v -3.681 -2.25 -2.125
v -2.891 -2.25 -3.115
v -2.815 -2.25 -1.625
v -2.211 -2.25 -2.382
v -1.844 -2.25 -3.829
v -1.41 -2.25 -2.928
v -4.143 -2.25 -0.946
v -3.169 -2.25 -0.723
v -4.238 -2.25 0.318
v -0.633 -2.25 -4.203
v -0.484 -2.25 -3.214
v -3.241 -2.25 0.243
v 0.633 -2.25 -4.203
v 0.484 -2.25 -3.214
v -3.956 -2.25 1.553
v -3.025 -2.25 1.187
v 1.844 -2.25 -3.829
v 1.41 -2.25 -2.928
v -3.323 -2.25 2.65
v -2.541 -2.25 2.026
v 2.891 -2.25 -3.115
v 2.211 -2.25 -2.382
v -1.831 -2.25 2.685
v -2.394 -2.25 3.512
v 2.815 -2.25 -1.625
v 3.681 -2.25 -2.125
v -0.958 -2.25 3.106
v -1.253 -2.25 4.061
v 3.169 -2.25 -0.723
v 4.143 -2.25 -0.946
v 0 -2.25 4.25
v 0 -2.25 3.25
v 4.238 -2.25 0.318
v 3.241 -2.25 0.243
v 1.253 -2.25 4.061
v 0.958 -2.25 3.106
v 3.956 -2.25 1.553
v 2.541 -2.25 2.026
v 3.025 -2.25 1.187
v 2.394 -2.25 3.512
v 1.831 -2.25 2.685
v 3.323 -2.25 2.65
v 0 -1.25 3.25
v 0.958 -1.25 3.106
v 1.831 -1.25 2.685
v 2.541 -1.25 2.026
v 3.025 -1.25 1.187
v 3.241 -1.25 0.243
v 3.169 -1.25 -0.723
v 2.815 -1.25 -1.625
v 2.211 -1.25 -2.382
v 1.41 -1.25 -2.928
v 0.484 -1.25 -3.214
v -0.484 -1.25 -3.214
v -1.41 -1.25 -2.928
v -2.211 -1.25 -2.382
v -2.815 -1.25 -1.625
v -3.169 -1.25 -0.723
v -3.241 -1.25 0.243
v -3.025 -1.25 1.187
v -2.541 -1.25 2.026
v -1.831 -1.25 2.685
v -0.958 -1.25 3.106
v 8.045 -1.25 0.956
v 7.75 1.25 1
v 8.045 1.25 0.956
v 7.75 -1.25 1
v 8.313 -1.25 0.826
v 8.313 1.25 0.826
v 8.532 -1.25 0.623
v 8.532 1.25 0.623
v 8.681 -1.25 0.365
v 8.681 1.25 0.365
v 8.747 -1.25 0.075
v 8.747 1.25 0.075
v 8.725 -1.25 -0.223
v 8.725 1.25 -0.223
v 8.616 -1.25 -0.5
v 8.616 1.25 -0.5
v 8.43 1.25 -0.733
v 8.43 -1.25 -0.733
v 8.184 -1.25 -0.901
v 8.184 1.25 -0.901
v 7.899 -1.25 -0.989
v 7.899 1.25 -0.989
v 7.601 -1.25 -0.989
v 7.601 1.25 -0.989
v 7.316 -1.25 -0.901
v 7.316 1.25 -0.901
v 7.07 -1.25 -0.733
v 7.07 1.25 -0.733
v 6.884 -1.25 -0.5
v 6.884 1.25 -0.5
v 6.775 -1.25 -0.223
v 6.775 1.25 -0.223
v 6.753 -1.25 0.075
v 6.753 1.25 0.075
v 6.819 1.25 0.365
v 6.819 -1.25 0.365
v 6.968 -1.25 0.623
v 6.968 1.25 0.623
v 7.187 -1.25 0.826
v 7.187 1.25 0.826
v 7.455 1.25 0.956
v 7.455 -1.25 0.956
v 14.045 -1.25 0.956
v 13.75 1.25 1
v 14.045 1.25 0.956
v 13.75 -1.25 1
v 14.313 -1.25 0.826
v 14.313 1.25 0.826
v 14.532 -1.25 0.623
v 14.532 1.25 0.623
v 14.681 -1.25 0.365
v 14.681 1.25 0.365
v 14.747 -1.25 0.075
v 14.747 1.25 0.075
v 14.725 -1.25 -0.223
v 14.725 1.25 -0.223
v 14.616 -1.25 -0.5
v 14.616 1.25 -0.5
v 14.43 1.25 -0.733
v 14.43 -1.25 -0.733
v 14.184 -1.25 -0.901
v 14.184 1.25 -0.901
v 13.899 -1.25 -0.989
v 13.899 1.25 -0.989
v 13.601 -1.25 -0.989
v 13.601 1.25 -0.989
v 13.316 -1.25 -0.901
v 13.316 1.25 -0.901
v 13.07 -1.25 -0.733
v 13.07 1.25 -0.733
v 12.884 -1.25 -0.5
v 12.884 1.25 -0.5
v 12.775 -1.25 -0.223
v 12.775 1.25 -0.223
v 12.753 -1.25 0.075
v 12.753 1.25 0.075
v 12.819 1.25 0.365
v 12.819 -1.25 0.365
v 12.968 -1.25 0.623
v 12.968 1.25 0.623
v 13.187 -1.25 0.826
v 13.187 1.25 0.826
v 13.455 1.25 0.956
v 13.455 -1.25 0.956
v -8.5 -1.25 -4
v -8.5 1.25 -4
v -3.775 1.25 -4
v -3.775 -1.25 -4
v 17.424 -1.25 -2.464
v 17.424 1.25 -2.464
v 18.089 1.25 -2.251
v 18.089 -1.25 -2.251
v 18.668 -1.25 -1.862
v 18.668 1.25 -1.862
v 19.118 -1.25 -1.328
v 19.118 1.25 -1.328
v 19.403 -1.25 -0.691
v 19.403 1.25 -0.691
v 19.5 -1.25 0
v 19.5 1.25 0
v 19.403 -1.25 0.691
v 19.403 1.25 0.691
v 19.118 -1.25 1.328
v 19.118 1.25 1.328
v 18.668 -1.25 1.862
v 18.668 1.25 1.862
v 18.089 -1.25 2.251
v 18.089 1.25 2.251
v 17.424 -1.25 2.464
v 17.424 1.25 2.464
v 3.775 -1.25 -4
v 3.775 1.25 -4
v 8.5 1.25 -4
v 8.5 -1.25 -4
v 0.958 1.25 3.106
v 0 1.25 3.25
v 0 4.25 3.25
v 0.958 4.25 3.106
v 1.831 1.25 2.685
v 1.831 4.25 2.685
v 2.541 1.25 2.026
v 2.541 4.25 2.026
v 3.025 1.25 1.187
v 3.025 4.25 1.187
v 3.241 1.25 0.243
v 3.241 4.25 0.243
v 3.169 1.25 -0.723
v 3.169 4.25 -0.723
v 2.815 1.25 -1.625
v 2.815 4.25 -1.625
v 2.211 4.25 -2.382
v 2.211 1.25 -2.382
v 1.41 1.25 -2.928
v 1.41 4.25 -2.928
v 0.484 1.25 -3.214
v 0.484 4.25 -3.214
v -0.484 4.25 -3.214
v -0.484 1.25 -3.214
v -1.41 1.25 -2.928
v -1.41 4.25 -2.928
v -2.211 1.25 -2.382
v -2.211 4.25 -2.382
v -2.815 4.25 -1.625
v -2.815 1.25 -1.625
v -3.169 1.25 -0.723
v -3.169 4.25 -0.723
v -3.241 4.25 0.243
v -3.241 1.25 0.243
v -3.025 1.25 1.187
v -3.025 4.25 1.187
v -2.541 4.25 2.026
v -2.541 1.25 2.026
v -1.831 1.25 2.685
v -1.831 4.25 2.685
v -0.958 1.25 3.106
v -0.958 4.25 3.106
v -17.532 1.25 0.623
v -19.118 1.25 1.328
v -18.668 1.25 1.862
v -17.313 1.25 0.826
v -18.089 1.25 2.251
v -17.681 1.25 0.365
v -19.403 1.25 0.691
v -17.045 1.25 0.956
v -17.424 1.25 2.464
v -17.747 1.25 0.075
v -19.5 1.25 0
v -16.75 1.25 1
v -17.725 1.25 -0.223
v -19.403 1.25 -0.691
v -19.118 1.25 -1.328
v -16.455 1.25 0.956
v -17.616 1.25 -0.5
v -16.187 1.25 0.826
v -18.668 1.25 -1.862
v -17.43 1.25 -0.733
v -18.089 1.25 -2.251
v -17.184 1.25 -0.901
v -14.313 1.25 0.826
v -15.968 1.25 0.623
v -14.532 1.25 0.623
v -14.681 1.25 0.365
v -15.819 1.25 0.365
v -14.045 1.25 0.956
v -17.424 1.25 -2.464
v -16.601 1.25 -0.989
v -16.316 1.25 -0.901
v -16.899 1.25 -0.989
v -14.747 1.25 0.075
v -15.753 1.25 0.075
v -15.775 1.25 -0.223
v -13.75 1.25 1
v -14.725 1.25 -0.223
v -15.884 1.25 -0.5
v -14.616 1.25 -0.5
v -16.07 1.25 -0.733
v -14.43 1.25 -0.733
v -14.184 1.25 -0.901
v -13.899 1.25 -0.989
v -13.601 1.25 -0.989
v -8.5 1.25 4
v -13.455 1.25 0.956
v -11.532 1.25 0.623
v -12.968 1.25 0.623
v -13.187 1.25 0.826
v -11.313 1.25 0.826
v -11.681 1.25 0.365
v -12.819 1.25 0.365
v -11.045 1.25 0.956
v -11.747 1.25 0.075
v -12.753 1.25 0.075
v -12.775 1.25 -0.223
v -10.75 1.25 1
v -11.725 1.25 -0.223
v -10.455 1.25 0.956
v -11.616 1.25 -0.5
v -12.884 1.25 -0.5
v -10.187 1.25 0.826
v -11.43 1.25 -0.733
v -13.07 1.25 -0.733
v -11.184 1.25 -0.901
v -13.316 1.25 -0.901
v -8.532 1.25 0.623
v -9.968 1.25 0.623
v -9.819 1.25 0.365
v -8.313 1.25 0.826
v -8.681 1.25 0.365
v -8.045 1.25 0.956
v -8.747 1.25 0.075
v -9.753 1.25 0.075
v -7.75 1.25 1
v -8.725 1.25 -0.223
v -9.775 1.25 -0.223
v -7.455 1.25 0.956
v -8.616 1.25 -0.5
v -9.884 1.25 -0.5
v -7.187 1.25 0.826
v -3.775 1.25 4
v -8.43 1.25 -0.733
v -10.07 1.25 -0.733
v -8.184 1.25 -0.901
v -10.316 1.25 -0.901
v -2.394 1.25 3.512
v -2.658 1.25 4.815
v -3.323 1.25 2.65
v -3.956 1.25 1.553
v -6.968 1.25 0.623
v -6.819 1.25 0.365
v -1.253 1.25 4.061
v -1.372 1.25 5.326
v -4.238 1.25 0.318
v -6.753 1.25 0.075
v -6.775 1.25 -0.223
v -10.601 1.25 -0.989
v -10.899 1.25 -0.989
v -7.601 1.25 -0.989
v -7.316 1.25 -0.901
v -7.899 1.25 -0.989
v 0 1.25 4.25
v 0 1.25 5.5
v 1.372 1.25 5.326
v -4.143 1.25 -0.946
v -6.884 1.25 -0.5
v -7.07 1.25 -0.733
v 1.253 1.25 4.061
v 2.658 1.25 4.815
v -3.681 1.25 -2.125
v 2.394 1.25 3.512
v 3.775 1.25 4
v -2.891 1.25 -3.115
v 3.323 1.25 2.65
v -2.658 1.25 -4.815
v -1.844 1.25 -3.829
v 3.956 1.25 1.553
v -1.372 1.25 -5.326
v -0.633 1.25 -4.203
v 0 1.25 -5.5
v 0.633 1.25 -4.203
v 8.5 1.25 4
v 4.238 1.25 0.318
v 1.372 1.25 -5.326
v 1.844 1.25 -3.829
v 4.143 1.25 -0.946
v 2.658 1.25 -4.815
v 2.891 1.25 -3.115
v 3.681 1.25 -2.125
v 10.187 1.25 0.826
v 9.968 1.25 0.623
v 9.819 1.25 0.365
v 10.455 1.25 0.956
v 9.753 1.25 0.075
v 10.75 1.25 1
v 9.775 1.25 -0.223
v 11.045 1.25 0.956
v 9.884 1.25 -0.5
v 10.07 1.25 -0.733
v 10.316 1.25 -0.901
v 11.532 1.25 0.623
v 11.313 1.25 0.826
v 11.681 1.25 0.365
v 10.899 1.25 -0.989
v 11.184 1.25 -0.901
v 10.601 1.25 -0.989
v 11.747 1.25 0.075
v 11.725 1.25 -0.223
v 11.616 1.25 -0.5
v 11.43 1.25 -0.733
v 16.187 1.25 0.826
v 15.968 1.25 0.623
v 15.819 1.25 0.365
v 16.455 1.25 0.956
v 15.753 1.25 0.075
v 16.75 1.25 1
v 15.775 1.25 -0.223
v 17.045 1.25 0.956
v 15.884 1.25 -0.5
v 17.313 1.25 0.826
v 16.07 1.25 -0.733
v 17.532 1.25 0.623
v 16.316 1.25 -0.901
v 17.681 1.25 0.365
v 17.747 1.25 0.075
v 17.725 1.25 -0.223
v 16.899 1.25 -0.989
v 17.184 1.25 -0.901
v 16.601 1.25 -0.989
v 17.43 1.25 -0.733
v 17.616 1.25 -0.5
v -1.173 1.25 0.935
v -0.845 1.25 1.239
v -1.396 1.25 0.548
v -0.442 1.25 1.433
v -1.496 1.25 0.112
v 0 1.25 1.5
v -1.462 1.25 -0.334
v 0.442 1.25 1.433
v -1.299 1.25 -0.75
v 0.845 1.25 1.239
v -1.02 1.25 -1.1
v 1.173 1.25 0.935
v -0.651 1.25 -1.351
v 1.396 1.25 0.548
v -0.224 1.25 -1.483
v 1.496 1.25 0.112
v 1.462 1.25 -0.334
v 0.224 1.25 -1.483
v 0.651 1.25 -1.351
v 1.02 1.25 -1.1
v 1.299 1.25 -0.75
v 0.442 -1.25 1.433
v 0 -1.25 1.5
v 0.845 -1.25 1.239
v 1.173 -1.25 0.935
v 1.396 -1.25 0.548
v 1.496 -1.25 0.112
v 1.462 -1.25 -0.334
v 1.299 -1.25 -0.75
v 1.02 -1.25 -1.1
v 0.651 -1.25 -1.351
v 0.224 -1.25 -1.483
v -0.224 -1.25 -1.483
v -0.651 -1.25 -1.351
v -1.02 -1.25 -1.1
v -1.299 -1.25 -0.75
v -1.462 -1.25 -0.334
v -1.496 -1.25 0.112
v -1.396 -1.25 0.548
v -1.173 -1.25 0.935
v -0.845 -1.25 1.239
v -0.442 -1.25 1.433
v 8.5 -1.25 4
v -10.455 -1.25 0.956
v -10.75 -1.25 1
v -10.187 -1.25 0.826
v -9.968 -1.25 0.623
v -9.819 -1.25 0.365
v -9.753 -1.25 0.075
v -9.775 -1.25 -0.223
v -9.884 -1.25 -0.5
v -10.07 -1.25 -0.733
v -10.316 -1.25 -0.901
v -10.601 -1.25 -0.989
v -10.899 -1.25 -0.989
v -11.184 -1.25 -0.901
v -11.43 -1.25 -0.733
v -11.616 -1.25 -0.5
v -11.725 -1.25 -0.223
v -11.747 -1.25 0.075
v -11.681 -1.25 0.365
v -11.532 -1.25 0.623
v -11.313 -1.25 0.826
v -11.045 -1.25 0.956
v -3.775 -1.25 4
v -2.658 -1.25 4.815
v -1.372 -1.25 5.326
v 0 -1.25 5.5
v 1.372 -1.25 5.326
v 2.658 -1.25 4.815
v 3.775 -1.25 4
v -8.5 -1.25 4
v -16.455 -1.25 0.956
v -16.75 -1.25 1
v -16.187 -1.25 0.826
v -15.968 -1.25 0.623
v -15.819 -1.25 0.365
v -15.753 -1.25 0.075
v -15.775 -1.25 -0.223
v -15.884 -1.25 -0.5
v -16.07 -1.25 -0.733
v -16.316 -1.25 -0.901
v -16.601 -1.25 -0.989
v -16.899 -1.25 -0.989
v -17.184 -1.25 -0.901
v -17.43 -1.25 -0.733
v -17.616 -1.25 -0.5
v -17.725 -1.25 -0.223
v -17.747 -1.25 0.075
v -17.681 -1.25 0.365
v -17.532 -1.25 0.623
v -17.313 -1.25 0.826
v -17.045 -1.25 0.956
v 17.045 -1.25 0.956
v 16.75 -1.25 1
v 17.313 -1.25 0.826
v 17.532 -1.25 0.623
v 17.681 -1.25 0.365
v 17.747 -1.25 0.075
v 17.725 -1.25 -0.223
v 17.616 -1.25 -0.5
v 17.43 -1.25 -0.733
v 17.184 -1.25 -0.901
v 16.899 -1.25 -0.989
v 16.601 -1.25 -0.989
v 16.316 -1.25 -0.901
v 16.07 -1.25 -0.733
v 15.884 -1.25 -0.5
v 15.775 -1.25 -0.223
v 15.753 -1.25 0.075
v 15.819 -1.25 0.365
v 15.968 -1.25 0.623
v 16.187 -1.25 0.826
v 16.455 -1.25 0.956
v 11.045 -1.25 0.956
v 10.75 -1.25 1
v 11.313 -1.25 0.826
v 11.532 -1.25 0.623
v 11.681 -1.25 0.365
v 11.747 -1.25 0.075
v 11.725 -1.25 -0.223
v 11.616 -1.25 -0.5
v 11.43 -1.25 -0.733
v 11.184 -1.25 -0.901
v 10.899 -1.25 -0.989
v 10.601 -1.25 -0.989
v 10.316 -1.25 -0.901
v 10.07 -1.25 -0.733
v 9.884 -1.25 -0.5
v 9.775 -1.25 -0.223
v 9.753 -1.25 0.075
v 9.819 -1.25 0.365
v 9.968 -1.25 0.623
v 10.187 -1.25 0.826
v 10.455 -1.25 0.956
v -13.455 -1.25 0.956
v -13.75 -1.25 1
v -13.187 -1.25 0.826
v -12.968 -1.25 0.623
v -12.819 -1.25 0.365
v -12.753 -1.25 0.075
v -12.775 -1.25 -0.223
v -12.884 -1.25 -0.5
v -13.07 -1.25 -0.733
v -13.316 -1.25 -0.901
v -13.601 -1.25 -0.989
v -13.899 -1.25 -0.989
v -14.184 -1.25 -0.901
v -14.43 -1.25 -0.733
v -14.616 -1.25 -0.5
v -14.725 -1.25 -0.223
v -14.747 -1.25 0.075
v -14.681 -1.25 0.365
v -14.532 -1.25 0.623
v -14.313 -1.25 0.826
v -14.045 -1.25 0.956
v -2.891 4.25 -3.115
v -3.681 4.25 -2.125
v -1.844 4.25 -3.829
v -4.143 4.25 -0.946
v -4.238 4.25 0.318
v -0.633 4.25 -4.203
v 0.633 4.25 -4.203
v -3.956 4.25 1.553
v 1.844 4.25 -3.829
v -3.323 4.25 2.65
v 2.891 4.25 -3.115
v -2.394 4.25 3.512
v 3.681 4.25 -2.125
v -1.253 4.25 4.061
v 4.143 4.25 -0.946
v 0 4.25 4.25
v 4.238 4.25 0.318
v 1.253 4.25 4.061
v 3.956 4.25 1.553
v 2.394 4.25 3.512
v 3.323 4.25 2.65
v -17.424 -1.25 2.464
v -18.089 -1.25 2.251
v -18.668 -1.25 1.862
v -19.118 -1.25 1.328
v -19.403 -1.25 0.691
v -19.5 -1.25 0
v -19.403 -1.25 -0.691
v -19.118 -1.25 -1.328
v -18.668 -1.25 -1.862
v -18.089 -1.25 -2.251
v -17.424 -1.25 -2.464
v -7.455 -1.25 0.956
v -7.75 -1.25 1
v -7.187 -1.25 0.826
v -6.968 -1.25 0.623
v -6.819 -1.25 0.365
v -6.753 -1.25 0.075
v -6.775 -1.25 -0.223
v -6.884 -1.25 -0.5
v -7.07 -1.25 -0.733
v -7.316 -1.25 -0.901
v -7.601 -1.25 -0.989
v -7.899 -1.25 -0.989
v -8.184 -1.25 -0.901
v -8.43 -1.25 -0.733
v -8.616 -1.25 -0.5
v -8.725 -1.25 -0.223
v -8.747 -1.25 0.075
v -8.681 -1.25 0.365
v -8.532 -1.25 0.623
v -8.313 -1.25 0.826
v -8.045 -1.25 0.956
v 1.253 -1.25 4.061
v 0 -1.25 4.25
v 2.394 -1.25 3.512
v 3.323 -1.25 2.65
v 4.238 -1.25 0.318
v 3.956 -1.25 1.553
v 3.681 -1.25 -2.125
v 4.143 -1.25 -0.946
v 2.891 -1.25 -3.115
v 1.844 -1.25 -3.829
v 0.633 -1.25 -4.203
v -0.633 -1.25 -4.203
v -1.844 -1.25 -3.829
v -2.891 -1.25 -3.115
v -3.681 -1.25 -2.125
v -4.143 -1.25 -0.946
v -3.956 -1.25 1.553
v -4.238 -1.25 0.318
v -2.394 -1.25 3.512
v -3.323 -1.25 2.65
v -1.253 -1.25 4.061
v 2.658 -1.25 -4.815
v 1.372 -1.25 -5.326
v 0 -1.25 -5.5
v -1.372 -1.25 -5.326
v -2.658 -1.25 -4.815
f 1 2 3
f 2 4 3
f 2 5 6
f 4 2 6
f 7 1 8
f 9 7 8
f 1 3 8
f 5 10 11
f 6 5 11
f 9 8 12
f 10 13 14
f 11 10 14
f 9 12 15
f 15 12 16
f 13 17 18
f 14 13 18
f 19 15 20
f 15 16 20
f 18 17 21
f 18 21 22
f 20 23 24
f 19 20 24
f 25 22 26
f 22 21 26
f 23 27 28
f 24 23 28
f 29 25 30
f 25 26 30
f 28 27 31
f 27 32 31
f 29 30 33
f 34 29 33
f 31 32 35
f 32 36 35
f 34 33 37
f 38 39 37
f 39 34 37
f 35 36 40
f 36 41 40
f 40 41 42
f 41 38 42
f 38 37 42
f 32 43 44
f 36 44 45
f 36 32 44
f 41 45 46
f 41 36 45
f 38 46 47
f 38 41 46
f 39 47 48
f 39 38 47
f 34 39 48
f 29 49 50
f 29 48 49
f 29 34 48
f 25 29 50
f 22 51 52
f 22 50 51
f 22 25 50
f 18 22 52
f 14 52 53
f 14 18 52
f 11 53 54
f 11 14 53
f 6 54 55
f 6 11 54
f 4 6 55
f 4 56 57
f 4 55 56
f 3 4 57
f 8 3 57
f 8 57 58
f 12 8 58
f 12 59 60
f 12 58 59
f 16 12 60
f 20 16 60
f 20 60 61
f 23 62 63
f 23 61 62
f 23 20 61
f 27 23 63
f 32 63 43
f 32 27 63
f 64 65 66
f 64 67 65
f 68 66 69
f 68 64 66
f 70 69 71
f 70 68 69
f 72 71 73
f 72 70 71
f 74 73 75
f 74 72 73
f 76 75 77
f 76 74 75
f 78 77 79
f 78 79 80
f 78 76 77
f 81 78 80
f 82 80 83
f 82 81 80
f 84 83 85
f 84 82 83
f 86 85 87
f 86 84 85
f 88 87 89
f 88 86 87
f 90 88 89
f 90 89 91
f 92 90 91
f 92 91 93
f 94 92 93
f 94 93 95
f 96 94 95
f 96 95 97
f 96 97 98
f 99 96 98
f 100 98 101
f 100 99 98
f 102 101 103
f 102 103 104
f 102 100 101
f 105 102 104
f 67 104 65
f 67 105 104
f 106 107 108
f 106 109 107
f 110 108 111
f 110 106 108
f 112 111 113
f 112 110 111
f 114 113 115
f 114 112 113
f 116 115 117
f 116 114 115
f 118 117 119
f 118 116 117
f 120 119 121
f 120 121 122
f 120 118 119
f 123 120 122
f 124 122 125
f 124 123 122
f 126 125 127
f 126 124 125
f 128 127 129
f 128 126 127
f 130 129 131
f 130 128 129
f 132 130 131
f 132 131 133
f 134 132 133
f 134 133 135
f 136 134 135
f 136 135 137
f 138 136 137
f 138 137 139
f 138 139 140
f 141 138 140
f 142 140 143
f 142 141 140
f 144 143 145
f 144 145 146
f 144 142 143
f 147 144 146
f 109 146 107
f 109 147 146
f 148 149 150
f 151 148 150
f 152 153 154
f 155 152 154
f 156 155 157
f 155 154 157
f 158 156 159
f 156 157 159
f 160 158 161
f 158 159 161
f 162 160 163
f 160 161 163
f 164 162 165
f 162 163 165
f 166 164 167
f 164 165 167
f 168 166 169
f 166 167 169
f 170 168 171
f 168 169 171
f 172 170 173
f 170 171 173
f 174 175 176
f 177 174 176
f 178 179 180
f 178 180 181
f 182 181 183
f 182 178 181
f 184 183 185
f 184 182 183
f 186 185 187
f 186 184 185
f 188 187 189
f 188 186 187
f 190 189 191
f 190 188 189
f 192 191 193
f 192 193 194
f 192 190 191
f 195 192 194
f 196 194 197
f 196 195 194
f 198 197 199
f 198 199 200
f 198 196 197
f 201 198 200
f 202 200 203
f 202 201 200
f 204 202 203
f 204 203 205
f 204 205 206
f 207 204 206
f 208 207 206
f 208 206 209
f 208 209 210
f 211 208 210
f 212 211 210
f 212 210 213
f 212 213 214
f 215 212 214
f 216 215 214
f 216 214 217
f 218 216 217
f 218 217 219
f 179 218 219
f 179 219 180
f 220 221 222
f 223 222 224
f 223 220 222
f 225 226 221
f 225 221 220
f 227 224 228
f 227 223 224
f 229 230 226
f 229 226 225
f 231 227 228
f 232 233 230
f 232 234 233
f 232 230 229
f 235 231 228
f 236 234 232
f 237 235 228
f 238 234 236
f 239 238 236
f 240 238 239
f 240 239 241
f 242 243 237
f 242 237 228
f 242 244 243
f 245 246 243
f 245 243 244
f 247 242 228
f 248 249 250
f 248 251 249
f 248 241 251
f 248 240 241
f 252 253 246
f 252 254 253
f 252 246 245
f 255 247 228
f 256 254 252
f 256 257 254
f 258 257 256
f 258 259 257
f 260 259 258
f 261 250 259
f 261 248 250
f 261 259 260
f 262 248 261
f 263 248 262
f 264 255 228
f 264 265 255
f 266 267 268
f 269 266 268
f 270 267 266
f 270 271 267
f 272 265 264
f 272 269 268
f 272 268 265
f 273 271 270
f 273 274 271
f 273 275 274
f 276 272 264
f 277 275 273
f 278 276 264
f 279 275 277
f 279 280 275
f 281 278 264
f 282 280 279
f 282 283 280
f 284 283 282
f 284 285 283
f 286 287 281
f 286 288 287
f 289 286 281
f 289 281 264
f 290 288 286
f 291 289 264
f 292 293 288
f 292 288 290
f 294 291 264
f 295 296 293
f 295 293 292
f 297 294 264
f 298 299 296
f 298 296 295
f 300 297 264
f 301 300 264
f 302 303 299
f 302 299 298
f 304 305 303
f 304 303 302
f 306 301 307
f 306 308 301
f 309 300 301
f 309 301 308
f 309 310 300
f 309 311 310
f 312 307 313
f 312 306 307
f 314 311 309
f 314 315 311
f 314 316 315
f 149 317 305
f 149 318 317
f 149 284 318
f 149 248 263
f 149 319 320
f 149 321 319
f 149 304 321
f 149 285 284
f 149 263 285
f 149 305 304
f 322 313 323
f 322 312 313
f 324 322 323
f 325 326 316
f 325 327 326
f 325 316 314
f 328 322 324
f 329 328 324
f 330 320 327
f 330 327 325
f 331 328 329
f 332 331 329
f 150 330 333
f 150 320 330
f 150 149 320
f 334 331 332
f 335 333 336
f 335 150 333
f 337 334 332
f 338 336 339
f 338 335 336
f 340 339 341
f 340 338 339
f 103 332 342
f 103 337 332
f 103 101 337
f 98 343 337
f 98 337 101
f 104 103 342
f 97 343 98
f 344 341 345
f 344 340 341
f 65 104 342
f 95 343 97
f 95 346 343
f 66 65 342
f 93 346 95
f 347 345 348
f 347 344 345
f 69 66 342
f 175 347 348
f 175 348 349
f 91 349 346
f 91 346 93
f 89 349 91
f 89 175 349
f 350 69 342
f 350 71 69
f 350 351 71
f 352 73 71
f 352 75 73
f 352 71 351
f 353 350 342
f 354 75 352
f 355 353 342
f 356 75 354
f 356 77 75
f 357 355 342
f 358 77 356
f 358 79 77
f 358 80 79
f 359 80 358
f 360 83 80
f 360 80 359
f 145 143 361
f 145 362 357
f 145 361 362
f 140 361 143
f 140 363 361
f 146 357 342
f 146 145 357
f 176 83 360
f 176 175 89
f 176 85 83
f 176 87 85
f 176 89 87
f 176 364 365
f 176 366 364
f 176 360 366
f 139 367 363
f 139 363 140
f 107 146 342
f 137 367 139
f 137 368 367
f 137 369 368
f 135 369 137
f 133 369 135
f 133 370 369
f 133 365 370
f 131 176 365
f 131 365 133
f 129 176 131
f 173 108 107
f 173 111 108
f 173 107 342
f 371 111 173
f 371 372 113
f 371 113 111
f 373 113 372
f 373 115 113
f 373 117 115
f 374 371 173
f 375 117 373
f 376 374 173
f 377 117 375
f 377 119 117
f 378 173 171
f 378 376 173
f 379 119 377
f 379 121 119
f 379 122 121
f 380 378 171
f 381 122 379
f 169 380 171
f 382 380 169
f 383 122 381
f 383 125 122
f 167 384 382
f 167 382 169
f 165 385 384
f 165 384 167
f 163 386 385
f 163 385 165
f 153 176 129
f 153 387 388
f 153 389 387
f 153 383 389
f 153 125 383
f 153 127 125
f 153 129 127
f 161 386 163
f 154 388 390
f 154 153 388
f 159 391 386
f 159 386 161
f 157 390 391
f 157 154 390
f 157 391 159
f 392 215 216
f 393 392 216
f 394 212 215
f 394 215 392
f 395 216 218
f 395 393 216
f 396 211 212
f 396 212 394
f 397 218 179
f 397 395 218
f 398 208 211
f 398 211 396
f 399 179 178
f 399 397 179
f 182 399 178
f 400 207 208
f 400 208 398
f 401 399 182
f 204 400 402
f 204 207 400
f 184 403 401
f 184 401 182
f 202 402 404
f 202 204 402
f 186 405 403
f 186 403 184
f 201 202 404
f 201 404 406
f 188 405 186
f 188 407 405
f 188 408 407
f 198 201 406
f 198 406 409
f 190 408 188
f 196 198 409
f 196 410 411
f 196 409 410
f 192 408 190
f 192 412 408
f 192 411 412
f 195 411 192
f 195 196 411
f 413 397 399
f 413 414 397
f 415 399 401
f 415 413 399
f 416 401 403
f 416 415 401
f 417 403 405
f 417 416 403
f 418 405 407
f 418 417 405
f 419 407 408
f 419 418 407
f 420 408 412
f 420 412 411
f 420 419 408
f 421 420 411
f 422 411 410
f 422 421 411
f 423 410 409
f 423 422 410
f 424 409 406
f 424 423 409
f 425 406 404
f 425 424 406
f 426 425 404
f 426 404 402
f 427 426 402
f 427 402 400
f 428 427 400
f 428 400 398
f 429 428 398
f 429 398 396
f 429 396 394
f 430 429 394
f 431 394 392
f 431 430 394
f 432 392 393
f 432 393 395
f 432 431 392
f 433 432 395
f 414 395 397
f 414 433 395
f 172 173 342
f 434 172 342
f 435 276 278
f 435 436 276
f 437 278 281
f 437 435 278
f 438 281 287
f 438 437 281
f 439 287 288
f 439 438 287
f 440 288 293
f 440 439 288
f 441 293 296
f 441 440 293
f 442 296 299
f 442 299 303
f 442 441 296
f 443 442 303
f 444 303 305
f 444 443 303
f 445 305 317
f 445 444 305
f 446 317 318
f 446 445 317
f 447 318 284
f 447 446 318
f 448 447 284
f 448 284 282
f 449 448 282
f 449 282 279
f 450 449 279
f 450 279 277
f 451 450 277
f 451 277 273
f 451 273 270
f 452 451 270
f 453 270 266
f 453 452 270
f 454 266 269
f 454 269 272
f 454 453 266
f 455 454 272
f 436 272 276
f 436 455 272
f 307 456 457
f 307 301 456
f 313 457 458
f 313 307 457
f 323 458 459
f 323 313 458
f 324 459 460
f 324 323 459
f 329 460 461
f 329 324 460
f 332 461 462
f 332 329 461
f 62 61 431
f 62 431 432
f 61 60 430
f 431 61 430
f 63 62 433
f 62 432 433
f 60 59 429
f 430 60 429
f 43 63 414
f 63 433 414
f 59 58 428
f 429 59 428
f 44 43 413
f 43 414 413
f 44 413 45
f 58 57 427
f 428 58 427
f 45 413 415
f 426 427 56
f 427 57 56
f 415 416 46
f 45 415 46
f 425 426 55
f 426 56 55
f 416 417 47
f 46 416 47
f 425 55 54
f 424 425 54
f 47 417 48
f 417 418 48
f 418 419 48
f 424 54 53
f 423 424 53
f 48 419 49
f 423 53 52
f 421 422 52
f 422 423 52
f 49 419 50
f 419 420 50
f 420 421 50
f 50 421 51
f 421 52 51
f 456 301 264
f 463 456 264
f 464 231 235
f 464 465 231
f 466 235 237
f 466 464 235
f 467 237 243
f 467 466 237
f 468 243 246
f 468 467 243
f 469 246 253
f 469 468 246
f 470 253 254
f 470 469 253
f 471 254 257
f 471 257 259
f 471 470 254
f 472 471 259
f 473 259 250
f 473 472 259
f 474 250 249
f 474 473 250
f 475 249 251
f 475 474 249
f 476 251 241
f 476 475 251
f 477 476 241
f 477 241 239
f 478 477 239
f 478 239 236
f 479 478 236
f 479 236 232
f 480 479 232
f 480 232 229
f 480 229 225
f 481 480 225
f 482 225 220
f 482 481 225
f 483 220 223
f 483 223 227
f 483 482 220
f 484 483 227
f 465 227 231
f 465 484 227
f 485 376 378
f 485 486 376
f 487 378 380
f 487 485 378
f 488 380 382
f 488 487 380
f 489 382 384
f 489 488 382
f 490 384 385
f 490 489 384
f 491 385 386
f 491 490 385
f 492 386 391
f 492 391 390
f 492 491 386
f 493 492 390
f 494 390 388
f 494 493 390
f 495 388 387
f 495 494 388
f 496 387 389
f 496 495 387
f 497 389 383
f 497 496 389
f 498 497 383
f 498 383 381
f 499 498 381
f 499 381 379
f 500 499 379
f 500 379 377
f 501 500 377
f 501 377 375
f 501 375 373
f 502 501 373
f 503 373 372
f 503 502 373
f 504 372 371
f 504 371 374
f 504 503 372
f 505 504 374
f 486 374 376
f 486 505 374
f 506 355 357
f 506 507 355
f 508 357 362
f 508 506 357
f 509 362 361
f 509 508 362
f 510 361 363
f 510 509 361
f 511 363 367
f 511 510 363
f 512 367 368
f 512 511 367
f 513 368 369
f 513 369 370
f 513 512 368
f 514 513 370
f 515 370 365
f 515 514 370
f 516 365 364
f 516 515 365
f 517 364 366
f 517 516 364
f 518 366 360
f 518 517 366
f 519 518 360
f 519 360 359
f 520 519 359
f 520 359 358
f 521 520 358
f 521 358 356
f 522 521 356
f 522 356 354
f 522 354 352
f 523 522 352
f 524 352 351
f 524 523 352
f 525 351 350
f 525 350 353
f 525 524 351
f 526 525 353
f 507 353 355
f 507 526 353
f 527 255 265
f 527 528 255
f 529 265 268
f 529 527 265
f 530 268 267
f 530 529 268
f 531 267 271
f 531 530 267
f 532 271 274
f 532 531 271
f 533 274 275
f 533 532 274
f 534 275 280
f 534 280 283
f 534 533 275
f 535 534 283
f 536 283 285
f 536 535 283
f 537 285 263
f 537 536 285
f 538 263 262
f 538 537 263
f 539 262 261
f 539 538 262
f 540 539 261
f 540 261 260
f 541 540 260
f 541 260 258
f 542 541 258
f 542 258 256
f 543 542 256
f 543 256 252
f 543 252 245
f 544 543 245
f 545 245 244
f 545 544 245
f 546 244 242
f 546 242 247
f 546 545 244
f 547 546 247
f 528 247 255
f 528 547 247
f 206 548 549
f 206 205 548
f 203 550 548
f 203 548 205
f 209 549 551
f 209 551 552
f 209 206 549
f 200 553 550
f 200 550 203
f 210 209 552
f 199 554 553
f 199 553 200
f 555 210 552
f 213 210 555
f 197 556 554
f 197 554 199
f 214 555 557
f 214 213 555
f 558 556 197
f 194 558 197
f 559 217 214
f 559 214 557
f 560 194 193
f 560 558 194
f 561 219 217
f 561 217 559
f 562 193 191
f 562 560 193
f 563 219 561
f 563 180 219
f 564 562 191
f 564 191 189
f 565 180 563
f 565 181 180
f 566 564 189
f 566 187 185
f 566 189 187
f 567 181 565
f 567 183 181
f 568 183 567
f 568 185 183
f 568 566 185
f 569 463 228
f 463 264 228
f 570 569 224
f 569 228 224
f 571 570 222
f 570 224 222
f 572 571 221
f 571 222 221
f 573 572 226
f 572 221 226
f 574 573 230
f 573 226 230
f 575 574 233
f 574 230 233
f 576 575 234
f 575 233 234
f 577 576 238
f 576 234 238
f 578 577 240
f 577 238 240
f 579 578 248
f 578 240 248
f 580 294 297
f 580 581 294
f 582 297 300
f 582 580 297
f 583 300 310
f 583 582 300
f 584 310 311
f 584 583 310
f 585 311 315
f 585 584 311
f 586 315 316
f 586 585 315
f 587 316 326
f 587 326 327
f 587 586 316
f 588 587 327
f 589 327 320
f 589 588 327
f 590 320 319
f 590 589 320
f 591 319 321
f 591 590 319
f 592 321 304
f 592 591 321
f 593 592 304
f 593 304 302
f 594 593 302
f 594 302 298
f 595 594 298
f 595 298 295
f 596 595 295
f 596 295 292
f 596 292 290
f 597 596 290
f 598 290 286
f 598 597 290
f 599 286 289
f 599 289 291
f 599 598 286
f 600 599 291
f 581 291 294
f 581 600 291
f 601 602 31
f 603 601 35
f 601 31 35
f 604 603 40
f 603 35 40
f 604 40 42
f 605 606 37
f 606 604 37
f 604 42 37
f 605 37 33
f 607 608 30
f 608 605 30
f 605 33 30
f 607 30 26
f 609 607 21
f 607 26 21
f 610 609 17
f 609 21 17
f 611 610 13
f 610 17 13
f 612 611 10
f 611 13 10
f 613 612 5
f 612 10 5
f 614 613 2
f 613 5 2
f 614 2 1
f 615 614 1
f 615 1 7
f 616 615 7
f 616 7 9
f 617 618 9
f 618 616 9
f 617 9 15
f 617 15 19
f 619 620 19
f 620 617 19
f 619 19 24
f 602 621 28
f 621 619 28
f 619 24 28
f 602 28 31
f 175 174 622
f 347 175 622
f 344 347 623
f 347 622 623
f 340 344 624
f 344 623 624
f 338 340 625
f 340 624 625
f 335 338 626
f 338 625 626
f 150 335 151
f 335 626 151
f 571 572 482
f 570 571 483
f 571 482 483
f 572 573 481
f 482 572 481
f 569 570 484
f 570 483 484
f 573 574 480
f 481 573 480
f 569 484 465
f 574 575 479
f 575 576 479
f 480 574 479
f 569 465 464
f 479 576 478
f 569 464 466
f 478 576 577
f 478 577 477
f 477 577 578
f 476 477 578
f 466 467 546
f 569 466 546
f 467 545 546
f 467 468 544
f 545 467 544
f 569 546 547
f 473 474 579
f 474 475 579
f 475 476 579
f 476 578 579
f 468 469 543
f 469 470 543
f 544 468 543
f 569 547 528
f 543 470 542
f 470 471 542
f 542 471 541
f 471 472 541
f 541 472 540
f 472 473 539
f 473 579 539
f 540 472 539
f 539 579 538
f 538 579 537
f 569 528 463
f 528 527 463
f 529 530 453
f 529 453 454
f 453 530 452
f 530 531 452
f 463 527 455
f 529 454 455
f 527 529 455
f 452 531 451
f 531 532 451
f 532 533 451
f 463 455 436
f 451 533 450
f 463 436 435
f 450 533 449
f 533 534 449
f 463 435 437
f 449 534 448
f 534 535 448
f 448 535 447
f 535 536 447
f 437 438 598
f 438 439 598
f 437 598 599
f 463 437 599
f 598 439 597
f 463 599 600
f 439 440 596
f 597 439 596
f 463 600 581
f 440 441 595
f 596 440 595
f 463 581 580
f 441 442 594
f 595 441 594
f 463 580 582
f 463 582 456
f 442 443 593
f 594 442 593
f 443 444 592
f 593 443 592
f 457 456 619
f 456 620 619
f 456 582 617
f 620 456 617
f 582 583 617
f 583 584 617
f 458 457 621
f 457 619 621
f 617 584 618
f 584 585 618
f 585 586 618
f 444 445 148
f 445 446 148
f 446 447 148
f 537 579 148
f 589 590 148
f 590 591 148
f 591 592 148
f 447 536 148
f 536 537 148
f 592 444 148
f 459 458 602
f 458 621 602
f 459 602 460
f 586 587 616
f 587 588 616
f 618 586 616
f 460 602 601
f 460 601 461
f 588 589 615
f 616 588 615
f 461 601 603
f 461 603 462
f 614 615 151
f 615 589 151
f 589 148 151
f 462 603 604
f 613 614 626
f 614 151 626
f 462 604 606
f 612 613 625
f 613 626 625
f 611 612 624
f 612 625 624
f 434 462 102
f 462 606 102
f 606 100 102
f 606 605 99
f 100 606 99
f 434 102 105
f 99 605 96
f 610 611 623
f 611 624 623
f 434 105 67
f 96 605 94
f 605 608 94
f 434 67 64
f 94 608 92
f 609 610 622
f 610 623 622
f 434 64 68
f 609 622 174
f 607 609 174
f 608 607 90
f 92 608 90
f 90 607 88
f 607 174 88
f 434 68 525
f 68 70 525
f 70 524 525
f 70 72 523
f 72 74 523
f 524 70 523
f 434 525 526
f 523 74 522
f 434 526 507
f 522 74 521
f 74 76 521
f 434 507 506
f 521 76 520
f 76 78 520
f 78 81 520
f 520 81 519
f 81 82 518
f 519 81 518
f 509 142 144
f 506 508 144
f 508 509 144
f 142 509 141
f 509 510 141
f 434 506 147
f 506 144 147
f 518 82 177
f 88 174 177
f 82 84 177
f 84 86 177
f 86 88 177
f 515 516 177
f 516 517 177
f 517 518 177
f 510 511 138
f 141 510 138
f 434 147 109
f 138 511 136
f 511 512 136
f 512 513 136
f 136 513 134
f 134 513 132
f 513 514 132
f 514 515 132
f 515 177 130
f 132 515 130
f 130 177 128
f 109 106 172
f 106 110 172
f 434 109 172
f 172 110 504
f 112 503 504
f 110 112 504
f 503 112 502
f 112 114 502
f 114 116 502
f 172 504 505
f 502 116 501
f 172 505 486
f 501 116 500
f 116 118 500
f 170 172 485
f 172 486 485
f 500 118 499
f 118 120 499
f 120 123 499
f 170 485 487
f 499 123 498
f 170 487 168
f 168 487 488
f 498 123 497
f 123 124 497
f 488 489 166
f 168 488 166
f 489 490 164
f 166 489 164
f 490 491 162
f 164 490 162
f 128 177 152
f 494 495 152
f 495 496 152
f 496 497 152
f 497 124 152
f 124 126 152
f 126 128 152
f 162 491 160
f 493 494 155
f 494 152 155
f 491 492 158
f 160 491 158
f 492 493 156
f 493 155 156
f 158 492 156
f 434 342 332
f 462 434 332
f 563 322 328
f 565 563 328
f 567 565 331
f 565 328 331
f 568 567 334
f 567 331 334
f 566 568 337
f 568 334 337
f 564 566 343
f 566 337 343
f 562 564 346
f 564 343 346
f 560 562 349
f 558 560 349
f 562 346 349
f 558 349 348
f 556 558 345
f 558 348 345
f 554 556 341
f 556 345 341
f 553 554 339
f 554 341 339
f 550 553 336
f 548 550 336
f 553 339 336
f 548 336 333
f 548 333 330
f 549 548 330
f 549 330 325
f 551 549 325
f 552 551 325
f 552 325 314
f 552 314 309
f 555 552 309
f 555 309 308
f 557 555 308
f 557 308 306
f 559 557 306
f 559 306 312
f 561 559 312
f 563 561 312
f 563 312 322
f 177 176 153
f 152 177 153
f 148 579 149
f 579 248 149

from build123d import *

# Parameters (mm, degrees)
SKETCH1_R                = 1
SKETCH1_R_2              = 1.5
BOSS_EXTRUDE1_DEPTH      = 1.25
BOSS_EXTRUDE2_DEPTH      = 3
BOSS_EXTRUDE2_DEPTH_BACK = 3.5
BOSS_EXTRUDE2_START      = 1.25
SKETCH3_R                = 4.25
SKETCH3_R_2              = 3.25


with BuildPart() as part:
    # Sketch1 → Boss-Extrude1 (new, symmetric)
    # profile 1 of 3: a face of its own
    with BuildSketch(Plane(origin=(0, 0, 0), x_dir=(1, 0, 0), z_dir=(0, 1, 0))):
        with BuildLine():
            ThreePointArc((17.424122962, 2.463761294), (19.5, 0), (17.424122962, -2.463761294))
            Line((17.424122962, -2.463761294), (8.5, -4))
            Line((8.5, -4), (-8.5, -4))
            Line((-8.5, -4), (-17.424122962, -2.463761294))
            ThreePointArc((-17.424122962, -2.463761294), (-19.5, 0), (-17.424122962, 2.463761294))
            Line((-17.424122962, 2.463761294), (-8.5, 4))
            Line((-8.5, 4), (8.5, 4))
            Line((8.5, 4), (17.424122962, 2.463761294))
        make_face()
        with Locations(Location((-7.75, 0, 0), (0, 0, 270))):
            Circle(SKETCH1_R, mode=Mode.SUBTRACT)
        with Locations(Location((-16.75, 0, 0), (0, 0, 270))):
            Circle(SKETCH1_R, mode=Mode.SUBTRACT)
        with Locations(Location((16.75, 0, 0), (0, 0, 270))):
            Circle(SKETCH1_R, mode=Mode.SUBTRACT)
        with Locations(Location((13.75, 0, 0), (0, 0, 270))):
            Circle(SKETCH1_R, mode=Mode.SUBTRACT)
        with Locations(Location((10.75, 0, 0), (0, 0, 270))):
            Circle(SKETCH1_R, mode=Mode.SUBTRACT)
        with Locations(Location((7.75, 0, 0), (0, 0, 270))):
            Circle(SKETCH1_R, mode=Mode.SUBTRACT)
        with Locations(Location((0, 0, 0), (0, 0, 270))):
            Circle(SKETCH1_R_2, mode=Mode.SUBTRACT)
        with Locations(Location((-13.75, 0, 0), (0, 0, 270))):
            Circle(SKETCH1_R, mode=Mode.SUBTRACT)
        with Locations(Location((-10.75, 0, 0), (0, 0, 270))):
            Circle(SKETCH1_R, mode=Mode.SUBTRACT)
    # profile 2 of 3: a face of its own
    with BuildSketch(Plane(origin=(0, 0, 0), x_dir=(1, 0, 0), z_dir=(0, 1, 0))):
        with BuildLine():
            ThreePointArc((3.774917218, 4), (0, 5.5), (-3.774917218, 4))
            Line((-3.774917218, 4), (3.774917218, 4))
        make_face()
    # profile 3 of 3: a face of its own
    with BuildSketch(Plane(origin=(0, 0, 0), x_dir=(1, 0, 0), z_dir=(0, 1, 0))):
        with BuildLine():
            Line((3.774917218, -4), (-3.774917218, -4))
            ThreePointArc((-3.774917218, -4), (0, -5.5), (3.774917218, -4))
        make_face()
    extrude(amount=BOSS_EXTRUDE1_DEPTH, both=True)

    # Sketch3 → Boss-Extrude2 (add, two sides: drawn at the far end of the back side and taken through both)
    with BuildSketch(Plane(origin=(0, 0, 0), x_dir=(1, 0, 0), z_dir=(0, 1, 0)).offset(BOSS_EXTRUDE2_START - BOSS_EXTRUDE2_DEPTH_BACK)):
        with Locations(Location((0, 0, 0), (0, 0, 270))):
            Circle(SKETCH3_R)
        with Locations(Location((0, 0, 0), (0, 0, 270))):
            Circle(SKETCH3_R_2, mode=Mode.SUBTRACT)
    extrude(amount=BOSS_EXTRUDE2_DEPTH + BOSS_EXTRUDE2_DEPTH_BACK)


solid = part.part
